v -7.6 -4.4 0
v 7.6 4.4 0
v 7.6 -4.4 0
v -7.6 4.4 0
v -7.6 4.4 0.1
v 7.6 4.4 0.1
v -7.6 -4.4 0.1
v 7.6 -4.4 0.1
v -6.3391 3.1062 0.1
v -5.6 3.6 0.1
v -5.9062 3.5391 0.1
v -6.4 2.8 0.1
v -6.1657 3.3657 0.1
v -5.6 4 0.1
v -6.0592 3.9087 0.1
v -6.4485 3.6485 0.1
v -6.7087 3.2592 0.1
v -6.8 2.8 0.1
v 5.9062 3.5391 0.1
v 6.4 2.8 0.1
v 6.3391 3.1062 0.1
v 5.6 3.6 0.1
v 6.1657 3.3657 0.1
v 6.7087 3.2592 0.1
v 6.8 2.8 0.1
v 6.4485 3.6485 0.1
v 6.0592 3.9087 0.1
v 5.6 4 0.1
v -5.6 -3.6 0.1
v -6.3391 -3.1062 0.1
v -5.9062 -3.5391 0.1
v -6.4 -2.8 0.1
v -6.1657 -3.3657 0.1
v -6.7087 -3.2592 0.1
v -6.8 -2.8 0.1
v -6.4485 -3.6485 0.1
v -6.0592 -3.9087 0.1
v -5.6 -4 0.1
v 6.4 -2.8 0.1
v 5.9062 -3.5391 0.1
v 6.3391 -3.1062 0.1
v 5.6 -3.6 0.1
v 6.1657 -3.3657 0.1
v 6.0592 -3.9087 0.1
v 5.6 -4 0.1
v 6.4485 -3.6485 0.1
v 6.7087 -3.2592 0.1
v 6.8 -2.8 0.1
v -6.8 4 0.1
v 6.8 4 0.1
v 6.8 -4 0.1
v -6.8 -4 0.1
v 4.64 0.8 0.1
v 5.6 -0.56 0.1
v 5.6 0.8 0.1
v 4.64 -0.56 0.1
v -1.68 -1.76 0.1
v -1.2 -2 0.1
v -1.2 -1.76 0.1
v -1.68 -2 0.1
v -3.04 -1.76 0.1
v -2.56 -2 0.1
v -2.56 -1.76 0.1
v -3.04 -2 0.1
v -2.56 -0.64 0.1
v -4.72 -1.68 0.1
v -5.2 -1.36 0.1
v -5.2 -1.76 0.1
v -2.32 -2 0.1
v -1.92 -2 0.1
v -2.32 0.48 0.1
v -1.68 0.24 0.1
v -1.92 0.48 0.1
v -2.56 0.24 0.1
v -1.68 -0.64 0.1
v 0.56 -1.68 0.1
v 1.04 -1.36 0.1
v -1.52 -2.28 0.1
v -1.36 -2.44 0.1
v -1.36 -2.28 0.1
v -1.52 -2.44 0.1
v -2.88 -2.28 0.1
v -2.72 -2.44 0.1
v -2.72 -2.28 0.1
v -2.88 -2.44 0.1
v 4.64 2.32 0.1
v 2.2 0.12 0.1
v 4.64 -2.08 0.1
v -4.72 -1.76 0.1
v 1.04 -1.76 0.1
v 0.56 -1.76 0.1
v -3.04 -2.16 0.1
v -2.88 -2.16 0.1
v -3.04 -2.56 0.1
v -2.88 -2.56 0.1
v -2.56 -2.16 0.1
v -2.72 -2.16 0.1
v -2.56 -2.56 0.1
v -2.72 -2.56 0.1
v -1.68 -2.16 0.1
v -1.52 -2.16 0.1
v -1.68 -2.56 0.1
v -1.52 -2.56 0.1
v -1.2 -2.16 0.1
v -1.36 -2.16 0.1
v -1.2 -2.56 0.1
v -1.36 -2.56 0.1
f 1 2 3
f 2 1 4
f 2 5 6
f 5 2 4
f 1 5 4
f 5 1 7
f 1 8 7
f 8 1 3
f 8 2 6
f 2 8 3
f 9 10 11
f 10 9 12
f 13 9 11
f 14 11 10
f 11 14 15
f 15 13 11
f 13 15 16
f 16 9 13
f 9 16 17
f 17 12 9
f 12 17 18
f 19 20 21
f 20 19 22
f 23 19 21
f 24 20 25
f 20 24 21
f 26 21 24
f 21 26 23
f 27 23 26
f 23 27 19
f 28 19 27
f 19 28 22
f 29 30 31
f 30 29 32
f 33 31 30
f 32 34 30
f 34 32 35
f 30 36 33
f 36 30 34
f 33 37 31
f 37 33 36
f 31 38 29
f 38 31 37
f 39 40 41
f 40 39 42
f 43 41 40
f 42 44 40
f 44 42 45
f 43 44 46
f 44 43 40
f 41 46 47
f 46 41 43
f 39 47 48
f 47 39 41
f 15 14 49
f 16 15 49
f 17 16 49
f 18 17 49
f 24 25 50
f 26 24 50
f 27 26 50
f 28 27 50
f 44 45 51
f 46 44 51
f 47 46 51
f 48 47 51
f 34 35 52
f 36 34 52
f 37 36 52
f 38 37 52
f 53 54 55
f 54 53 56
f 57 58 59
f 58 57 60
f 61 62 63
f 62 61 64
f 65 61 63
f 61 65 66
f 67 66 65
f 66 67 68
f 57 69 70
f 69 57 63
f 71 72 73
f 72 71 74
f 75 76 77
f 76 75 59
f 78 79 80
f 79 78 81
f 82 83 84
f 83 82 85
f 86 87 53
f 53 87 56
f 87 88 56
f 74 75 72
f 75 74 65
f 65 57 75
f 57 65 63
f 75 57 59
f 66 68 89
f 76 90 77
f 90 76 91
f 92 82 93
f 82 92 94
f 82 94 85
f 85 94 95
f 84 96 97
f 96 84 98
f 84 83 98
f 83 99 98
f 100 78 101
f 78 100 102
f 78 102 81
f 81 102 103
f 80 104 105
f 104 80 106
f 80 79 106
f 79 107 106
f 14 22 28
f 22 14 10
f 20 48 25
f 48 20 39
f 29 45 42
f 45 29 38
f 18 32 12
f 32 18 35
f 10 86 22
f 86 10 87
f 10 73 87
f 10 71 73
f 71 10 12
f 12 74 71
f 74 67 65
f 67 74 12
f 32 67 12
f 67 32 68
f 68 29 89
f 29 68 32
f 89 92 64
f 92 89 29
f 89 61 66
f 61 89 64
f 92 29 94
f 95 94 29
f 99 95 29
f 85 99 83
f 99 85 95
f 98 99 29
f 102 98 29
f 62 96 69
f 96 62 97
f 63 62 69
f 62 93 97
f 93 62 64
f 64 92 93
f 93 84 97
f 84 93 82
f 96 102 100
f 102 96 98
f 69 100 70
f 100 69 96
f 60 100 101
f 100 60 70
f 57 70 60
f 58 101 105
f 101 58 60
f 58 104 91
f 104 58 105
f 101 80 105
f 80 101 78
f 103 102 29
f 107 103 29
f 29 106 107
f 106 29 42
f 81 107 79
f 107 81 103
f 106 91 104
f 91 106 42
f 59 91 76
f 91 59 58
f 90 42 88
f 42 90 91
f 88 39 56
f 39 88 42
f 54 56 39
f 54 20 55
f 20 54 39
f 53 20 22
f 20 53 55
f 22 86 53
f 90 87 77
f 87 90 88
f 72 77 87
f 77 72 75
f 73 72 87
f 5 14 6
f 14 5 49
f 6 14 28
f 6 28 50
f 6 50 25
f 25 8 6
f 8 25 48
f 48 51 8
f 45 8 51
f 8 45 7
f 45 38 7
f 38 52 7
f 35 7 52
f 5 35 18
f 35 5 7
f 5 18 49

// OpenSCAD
// file: ../p/box5-12.scad
use <../lib.scad>
function ldraw_lib__box5_12() = [
// 0 Box with 5 Faces without Any Edges
// 0 Name: box5-12.dat
// 0 Author: Chris Dee [cwdee]
// 0 !LDRAW_ORG Primitive UPDATE 2009-02
// 0 !LICENSE Licensed under CC BY 2.0 and CC BY 4.0 : see CAreadme.txt
// 
// 0 BFC CERTIFY CCW
  [0,"BFC","CERTIFY"],
  [0,"BFC","CCW"],
// 
// 0 !HISTORY 2009-09-03 [PTadmin] Official Update 2009-02
// 
// 
// 4 16 1 1 1 1 1 -1 -1 1 -1 -1 1 1
  [4,16,1,1,1,1,1,-1,-1,1,-1,-1,1,1],
// 4 16 -1 0 1 1 0 1 1 1 1 -1 1 1
  [4,16,-1,0,1,1,0,1,1,1,1,-1,1,1],
// 4 16 -1 0 -1 -1 0 1 -1 1 1 -1 1 -1
  [4,16,-1,0,-1,-1,0,1,-1,1,1,-1,1,-1],
// 4 16 1 0 -1 -1 0 -1 -1 1 -1 1 1 -1
  [4,16,1,0,-1,-1,0,-1,-1,1,-1,1,1,-1],
// 4 16 1 0 1 1 0 -1 1 1 -1 1 1 1
  [4,16,1,0,1,1,0,-1,1,1,-1,1,1,1],
// 0
];
module ldraw_lib__box5_12(step=0, col=false, unit=2/5, alt=false, line=0.2, solid=!$preview)
    makepoly(ldraw_lib__box5_12(), step=step, col=col, unit=unit, alt=alt, line=line, solid=solid);
ldraw_lib__box5_12(line=0.2);
// file: ../p/1-4ring2.scad
use <../lib.scad>
function ldraw_lib__1_4ring2() = [
// 0 Ring  2 x 0.25
// 0 Name: 1-4ring2.dat
// 0 Author: Franklin W. Cain [fwcain]
// 0 !LDRAW_ORG Primitive UPDATE 2015-01
// 0 !LICENSE Licensed under CC BY 2.0 and CC BY 4.0 : see CAreadme.txt
// 
// 0 BFC CERTIFY CCW
  [0,"BFC","CERTIFY"],
  [0,"BFC","CCW"],
// 
// 0 !HISTORY 2001-12-31 [PTadmin] Official Update 2001-03
// 0 !HISTORY 2007-06-22 [PTadmin] Header formatted for Contributor Agreement
// 0 !HISTORY 2008-07-01 [PTadmin] Official Update 2008-01
// 0 !HISTORY 2012-02-16 [Philo] Changed to CCW
// 0 !HISTORY 2012-03-30 [PTadmin] Official Update 2012-01
// 0 !HISTORY 2014-12-25 [MMR1988] Fixed a rounding issue
// 0 !HISTORY 2015-10-11 [PTadmin] Official Update 2015-01
// 
// 
// 4 16 3 0 0 2.7717 0 1.1481 1.8478 0 0.7654 2 0 0
  [4,16,3,0,0,2.7717,0,1.1481,1.8478,0,0.7654,2,0,0],
// 4 16 2.7717 0 1.1481 2.1213 0 2.1213 1.4142 0 1.4142 1.8478 0 0.7654
  [4,16,2.7717,0,1.1481,2.1213,0,2.1213,1.4142,0,1.4142,1.8478,0,0.7654],
// 4 16 2.1213 0 2.1213 1.1481 0 2.7717 0.7654 0 1.8478 1.4142 0 1.4142
  [4,16,2.1213,0,2.1213,1.1481,0,2.7717,0.7654,0,1.8478,1.4142,0,1.4142],
// 4 16 1.1481 0 2.7717 0 0 3 0 0 2 0.7654 0 1.8478
  [4,16,1.1481,0,2.7717,0,0,3,0,0,2,0.7654,0,1.8478],
// 0 // Build by Primitive Generator 2
];
module ldraw_lib__1_4ring2(step=0, col=false, unit=2/5, alt=false, line=0.2, solid=!$preview)
    makepoly(ldraw_lib__1_4ring2(), step=step, col=col, unit=unit, alt=alt, line=line, solid=solid);
ldraw_lib__1_4ring2(line=0.2);
// file: ../p/1-4ndis.scad
use <../lib.scad>
function ldraw_lib__1_4ndis() = [
// 0 Disc Negative 0.25
// 0 Name: 1-4ndis.dat
// 0 Author: James Jessiman
// 0 !LDRAW_ORG Primitive UPDATE 2012-01
// 0 !LICENSE Licensed under CC BY 2.0 and CC BY 4.0 : see CAreadme.txt
// 
// 0 BFC CERTIFY CCW
  [0,"BFC","CERTIFY"],
  [0,"BFC","CCW"],
// 
// 0 !HISTORY 2002-03-23 [sbliss] Added BFC Statement
// 0 !HISTORY 2002-04-25 [PTadmin] Official Update 2002-02
// 0 !HISTORY 2007-06-22 [PTadmin] Header formatted for Contributor Agreement
// 0 !HISTORY 2008-07-01 [PTadmin] Official Update 2008-01
// 0 !HISTORY 2012-02-16 [Philo] Changed to CCW
// 0 !HISTORY 2012-03-30 [PTadmin] Official Update 2012-01
// 
// 
// 3 16 0.9239 0 0.3827 1 0 0 1 0 1
  [3,16,0.9239,0,0.3827,1,0,0,1,0,1],
// 3 16 0.7071 0 0.7071 0.9239 0 0.3827 1 0 1
  [3,16,0.7071,0,0.7071,0.9239,0,0.3827,1,0,1],
// 3 16 0.3827 0 0.9239 0.7071 0 0.7071 1 0 1
  [3,16,0.3827,0,0.9239,0.7071,0,0.7071,1,0,1],
// 3 16 0 0 1 0.3827 0 0.9239 1 0 1
  [3,16,0,0,1,0.3827,0,0.9239,1,0,1],
];
module ldraw_lib__1_4ndis(step=0, col=false, unit=2/5, alt=false, line=0.2, solid=!$preview)
    makepoly(ldraw_lib__1_4ndis(), step=step, col=col, unit=unit, alt=alt, line=line, solid=solid);
ldraw_lib__1_4ndis(line=0.2);
// file: ../p/1-4chrd.scad
use <../lib.scad>
function ldraw_lib__1_4chrd() = [
// 0 Chord 0.25
// 0 Name: 1-4chrd.dat
// 0 Author: Tony Hafner [hafhead]
// 0 !LDRAW_ORG Primitive UPDATE 2012-02
// 0 !LICENSE Licensed under CC BY 2.0 and CC BY 4.0 : see CAreadme.txt
// 
// 0 BFC CERTIFY CCW
  [0,"BFC","CERTIFY"],
  [0,"BFC","CCW"],
// 
// 0 !HISTORY 2004-04-22 [PTadmin] Official Update 2004-02
// 0 !HISTORY 2007-10-09 [PTadmin] Header formatted for Contributor Agreement
// 0 !HISTORY 2008-07-01 [PTadmin] Official Update 2008-01
// 0 !HISTORY 2012-08-02 [MMR1988] Re-creation with PrimGen2 and Rectifier
// 0 !HISTORY 2012-08-09 [PTadmin] Official Update 2012-02
// 
// 
// 4 16 0.9239 0 0.3827 0.3827 0 0.9239 0 0 1 1 0 0
  [4,16,0.9239,0,0.3827,0.3827,0,0.9239,0,0,1,1,0,0],
// 3 16 0.7071 0 0.7071 0.3827 0 0.9239 0.9239 0 0.3827
  [3,16,0.7071,0,0.7071,0.3827,0,0.9239,0.9239,0,0.3827],
];
module ldraw_lib__1_4chrd(step=0, col=false, unit=2/5, alt=false, line=0.2, solid=!$preview)
    makepoly(ldraw_lib__1_4chrd(), step=step, col=col, unit=unit, alt=alt, line=line, solid=solid);
ldraw_lib__1_4chrd(line=0.2);
// main file
use <../lib.scad>
use <../p/1-4chrd.scad>
use <../p/1-4ndis.scad>
use <../p/1-4ring2.scad>
use <../p/box5-12.scad>
function ldraw_lib__163156c() = [
// 0 Sticker  1.1 x  1.9 with Town Airport Direction Signs - Left
// 0 Name: 163156c.dat
// 0 Author: Takeshi Takahashi [RainbowDolphin]
// 0 !LDRAW_ORG Part UPDATE 2020-03
// 0 !LICENSE Licensed under CC BY 2.0 and CC BY 4.0 : see CAreadme.txt
// 
// 0 BFC CERTIFY CCW
  [0,"BFC","CERTIFY"],
  [0,"BFC","CCW"],
// 
// 0 !KEYWORDS set 6396
// 
// 0 !HISTORY 2018-01-08 [bercik] OMR version by Robert Paciorek [bercik] with permission of Zoltank82
// 0 !HISTORY 2020-06-24 [RainbowDolphin] File preparation for LDraw Parts Tracker
// 0 !HISTORY 2020-12-29 [PTadmin] Official Update 2020-03
// 
// 
// 1 16 0 -0.25 0 19 0 0 0 0.25 0 0 0 11 box5-12.dat
  [1,16,0,-0.25,0,19,0,0,0,0.25,0,0,0,11, ldraw_lib__box5_12()],
// 
// 1 7 -14 -0.25 7 0 0 -2 0 1 0 2 0 0 1-4chrd.dat
  [1,7,-14,-0.25,7,0,0,-2,0,1,0,2,0,0, ldraw_lib__1_4chrd()],
// 1 0 -14 -0.25 7 0 0 -1 0 1 0 1 0 0 1-4ring2.dat
  [1,0,-14,-0.25,7,0,0,-1,0,1,0,1,0,0, ldraw_lib__1_4ring2()],
// 1 7 14 -0.25 7 2 0 0 0 1 0 0 0 2 1-4chrd.dat
  [1,7,14,-0.25,7,2,0,0,0,1,0,0,0,2, ldraw_lib__1_4chrd()],
// 1 0 14 -0.25 7 1 0 0 0 1 0 0 0 1 1-4ring2.dat
  [1,0,14,-0.25,7,1,0,0,0,1,0,0,0,1, ldraw_lib__1_4ring2()],
// 1 7 -14 -0.25 -7 -2 0 0 0 1 0 0 0 -2 1-4chrd.dat
  [1,7,-14,-0.25,-7,-2,0,0,0,1,0,0,0,-2, ldraw_lib__1_4chrd()],
// 1 0 -14 -0.25 -7 -1 0 0 0 1 0 0 0 -1 1-4ring2.dat
  [1,0,-14,-0.25,-7,-1,0,0,0,1,0,0,0,-1, ldraw_lib__1_4ring2()],
// 1 7 14 -0.25 -7 0 0 2 0 1 0 -2 0 0 1-4chrd.dat
  [1,7,14,-0.25,-7,0,0,2,0,1,0,-2,0,0, ldraw_lib__1_4chrd()],
// 1 0 14 -0.25 -7 0 0 1 0 1 0 -1 0 0 1-4ring2.dat
  [1,0,14,-0.25,-7,0,0,1,0,1,0,-1,0,0, ldraw_lib__1_4ring2()],
// 1 16 -14 -0.25 7 0 0 -3 0 1 0 3 0 0 1-4ndis.dat
  [1,16,-14,-0.25,7,0,0,-3,0,1,0,3,0,0, ldraw_lib__1_4ndis()],
// 1 16 14 -0.25 7 3 0 0 0 1 0 0 0 3 1-4ndis.dat
  [1,16,14,-0.25,7,3,0,0,0,1,0,0,0,3, ldraw_lib__1_4ndis()],
// 1 16 14 -0.25 -7 0 0 3 0 1 0 -3 0 0 1-4ndis.dat
  [1,16,14,-0.25,-7,0,0,3,0,1,0,-3,0,0, ldraw_lib__1_4ndis()],
// 1 16 -14 -0.25 -7 -3 0 0 0 1 0 0 0 -3 1-4ndis.dat
  [1,16,-14,-0.25,-7,-3,0,0,0,1,0,0,0,-3, ldraw_lib__1_4ndis()],
// 4 4 14 -0.25 -1.4 14 -0.25 2 11.6 -0.25 2 11.6 -0.25 -1.4
  [4,4,14,-0.25,-1.4,14,-0.25,2,11.6,-0.25,2,11.6,-0.25,-1.4],
// 4 0 -3 -0.25 -5 -3 -0.25 -4.4 -4.2 -0.25 -4.4 -4.2 -0.25 -5
  [4,0,-3,-0.25,-5,-3,-0.25,-4.4,-4.2,-0.25,-4.4,-4.2,-0.25,-5],
// 4 0 -6.4 -0.25 -5 -6.4 -0.25 -4.4 -7.6 -0.25 -4.4 -7.6 -0.25 -5
  [4,0,-6.4,-0.25,-5,-6.4,-0.25,-4.4,-7.6,-0.25,-4.4,-7.6,-0.25,-5],
// 4 0 -7.6 -0.25 -4.4 -6.4 -0.25 -4.4 -6.4 -0.25 -1.6 -11.8 -0.25 -4.2
  [4,0,-7.6,-0.25,-4.4,-6.4,-0.25,-4.4,-6.4,-0.25,-1.6,-11.8,-0.25,-4.2],
// 4 0 -11.8 -0.25 -4.2 -6.4 -0.25 -1.6 -13 -0.25 -3.4 -13 -0.25 -4.4
  [4,0,-11.8,-0.25,-4.2,-6.4,-0.25,-1.6,-13,-0.25,-3.4,-13,-0.25,-4.4],
// 4 0 -5.8 -0.25 -5 -4.8 -0.25 -5 -4.2 -0.25 -4.4 -6.4 -0.25 -4.4
  [4,0,-5.8,-0.25,-5,-4.8,-0.25,-5,-4.2,-0.25,-4.4,-6.4,-0.25,-4.4],
// 4 0 -4.2 -0.25 0.6 -4.8 -0.25 1.2 -5.8 -0.25 1.2 -6.4 -0.25 0.6
  [4,0,-4.2,-0.25,0.6,-4.8,-0.25,1.2,-5.8,-0.25,1.2,-6.4,-0.25,0.6],
// 4 0 -3 -0.25 -4.4 1.4 -0.25 -4.2 2.6 -0.25 -3.4 -4.2 -0.25 -1.6
  [4,0,-3,-0.25,-4.4,1.4,-0.25,-4.2,2.6,-0.25,-3.4,-4.2,-0.25,-1.6],
// 4 0 -3.4 -0.25 -6.1 -3.4 -0.25 -5.7 -3.8 -0.25 -5.7 -3.8 -0.25 -6.1
  [4,0,-3.4,-0.25,-6.1,-3.4,-0.25,-5.7,-3.8,-0.25,-5.7,-3.8,-0.25,-6.1],
// 4 0 -6.8 -0.25 -6.1 -6.8 -0.25 -5.7 -7.2 -0.25 -5.7 -7.2 -0.25 -6.1
  [4,0,-6.8,-0.25,-6.1,-6.8,-0.25,-5.7,-7.2,-0.25,-5.7,-7.2,-0.25,-6.1],
// 3 4 11.6 -0.25 5.8 5.5 -0.25 0.3 11.6 -0.25 2
  [3,4,11.6,-0.25,5.8,5.5,-0.25,0.3,11.6,-0.25,2],
// 3 4 11.6 -0.25 2 5.5 -0.25 0.3 11.6 -0.25 -1.4
  [3,4,11.6,-0.25,2,5.5,-0.25,0.3,11.6,-0.25,-1.4],
// 3 4 5.5 -0.25 0.3 11.6 -0.25 -5.2 11.6 -0.25 -1.4
  [3,4,5.5,-0.25,0.3,11.6,-0.25,-5.2,11.6,-0.25,-1.4],
// 4 0 -4.2 -0.25 0.6 -6.4 -0.25 0.6 -6.4 -0.25 -1.6 -4.2 -0.25 -1.6
  [4,0,-4.2,-0.25,0.6,-6.4,-0.25,0.6,-6.4,-0.25,-1.6,-4.2,-0.25,-1.6],
// 4 0 -4.2 -0.25 -1.6 -6.4 -0.25 -1.6 -6.4 -0.25 -4.4 -4.2 -0.25 -4.4
  [4,0,-4.2,-0.25,-1.6,-6.4,-0.25,-1.6,-6.4,-0.25,-4.4,-4.2,-0.25,-4.4],
// 3 0 -4.2 -0.25 -1.6 -4.2 -0.25 -4.4 -3 -0.25 -4.4
  [3,0,-4.2,-0.25,-1.6,-4.2,-0.25,-4.4,-3,-0.25,-4.4],
// 3 0 -11.8 -0.25 -4.2 -13 -0.25 -4.4 -11.8 -0.25 -4.4
  [3,0,-11.8,-0.25,-4.2,-13,-0.25,-4.4,-11.8,-0.25,-4.4],
// 4 0 2.6 -0.25 -4.4 2.6 -0.25 -3.4 1.4 -0.25 -4.2 1.4 -0.25 -4.4
  [4,0,2.6,-0.25,-4.4,2.6,-0.25,-3.4,1.4,-0.25,-4.2,1.4,-0.25,-4.4],
// 4 0 -7.2 -0.25 -5.7 -7.2 -0.25 -5.4 -7.6 -0.25 -5.4 -7.6 -0.25 -6.4
  [4,0,-7.2,-0.25,-5.7,-7.2,-0.25,-5.4,-7.6,-0.25,-5.4,-7.6,-0.25,-6.4],
// 3 0 -7.2 -0.25 -5.7 -7.6 -0.25 -6.4 -7.2 -0.25 -6.1
  [3,0,-7.2,-0.25,-5.7,-7.6,-0.25,-6.4,-7.2,-0.25,-6.1],
// 3 0 -7.2 -0.25 -6.1 -7.6 -0.25 -6.4 -7.2 -0.25 -6.4
  [3,0,-7.2,-0.25,-6.1,-7.6,-0.25,-6.4,-7.2,-0.25,-6.4],
// 4 0 -6.4 -0.25 -5.4 -6.8 -0.25 -5.4 -6.8 -0.25 -5.7 -6.4 -0.25 -6.4
  [4,0,-6.4,-0.25,-5.4,-6.8,-0.25,-5.4,-6.8,-0.25,-5.7,-6.4,-0.25,-6.4],
// 3 0 -6.8 -0.25 -5.7 -6.8 -0.25 -6.1 -6.4 -0.25 -6.4
  [3,0,-6.8,-0.25,-5.7,-6.8,-0.25,-6.1,-6.4,-0.25,-6.4],
// 3 0 -6.8 -0.25 -6.1 -6.8 -0.25 -6.4 -6.4 -0.25 -6.4
  [3,0,-6.8,-0.25,-6.1,-6.8,-0.25,-6.4,-6.4,-0.25,-6.4],
// 4 0 -3.8 -0.25 -5.7 -3.8 -0.25 -5.4 -4.2 -0.25 -5.4 -4.2 -0.25 -6.4
  [4,0,-3.8,-0.25,-5.7,-3.8,-0.25,-5.4,-4.2,-0.25,-5.4,-4.2,-0.25,-6.4],
// 3 0 -3.8 -0.25 -5.7 -4.2 -0.25 -6.4 -3.8 -0.25 -6.1
  [3,0,-3.8,-0.25,-5.7,-4.2,-0.25,-6.4,-3.8,-0.25,-6.1],
// 3 0 -3.8 -0.25 -6.1 -4.2 -0.25 -6.4 -3.8 -0.25 -6.4
  [3,0,-3.8,-0.25,-6.1,-4.2,-0.25,-6.4,-3.8,-0.25,-6.4],
// 4 0 -3 -0.25 -5.4 -3.4 -0.25 -5.4 -3.4 -0.25 -5.7 -3 -0.25 -6.4
  [4,0,-3,-0.25,-5.4,-3.4,-0.25,-5.4,-3.4,-0.25,-5.7,-3,-0.25,-6.4],
// 3 0 -3.4 -0.25 -5.7 -3.4 -0.25 -6.1 -3 -0.25 -6.4
  [3,0,-3.4,-0.25,-5.7,-3.4,-0.25,-6.1,-3,-0.25,-6.4],
// 3 0 -3.4 -0.25 -6.1 -3.4 -0.25 -6.4 -3 -0.25 -6.4
  [3,0,-3.4,-0.25,-6.1,-3.4,-0.25,-6.4,-3,-0.25,-6.4],
// 4 0 14 -0.25 10 -14 -0.25 10 -14 -0.25 9 14 -0.25 9
  [4,0,14,-0.25,10,-14,-0.25,10,-14,-0.25,9,14,-0.25,9],
// 4 0 17 -0.25 7 16 -0.25 7 16 -0.25 -7 17 -0.25 -7
  [4,0,17,-0.25,7,16,-0.25,7,16,-0.25,-7,17,-0.25,-7],
// 4 0 14 -0.25 -9 -14 -0.25 -9 -14 -0.25 -10 14 -0.25 -10
  [4,0,14,-0.25,-9,-14,-0.25,-9,-14,-0.25,-10,14,-0.25,-10],
// 4 0 -16 -0.25 7 -17 -0.25 7 -17 -0.25 -7 -16 -0.25 -7
  [4,0,-16,-0.25,7,-17,-0.25,7,-17,-0.25,-7,-16,-0.25,-7],
// 4 7 11.6 -0.25 5.8 14 -0.25 9 -14 -0.25 9 5.5 -0.25 0.3
  [4,7,11.6,-0.25,5.8,14,-0.25,9,-14,-0.25,9,5.5,-0.25,0.3],
// 3 7 -14 -0.25 9 -4.8 -0.25 1.2 5.5 -0.25 0.3
  [3,7,-14,-0.25,9,-4.8,-0.25,1.2,5.5,-0.25,0.3],
// 4 7 -5.8 -0.25 1.2 -4.8 -0.25 1.2 -14 -0.25 9 -16 -0.25 7
  [4,7,-5.8,-0.25,1.2,-4.8,-0.25,1.2,-14,-0.25,9,-16,-0.25,7],
// 3 7 -16 -0.25 7 -6.4 -0.25 0.6 -5.8 -0.25 1.2
  [3,7,-16,-0.25,7,-6.4,-0.25,0.6,-5.8,-0.25,1.2],
// 4 7 -6.4 -0.25 -1.6 -6.4 -0.25 0.6 -16 -0.25 7 -13 -0.25 -3.4
  [4,7,-6.4,-0.25,-1.6,-6.4,-0.25,0.6,-16,-0.25,7,-13,-0.25,-3.4],
// 4 7 -13 -0.25 -3.4 -16 -0.25 7 -16 -0.25 -7 -13 -0.25 -4.4
  [4,7,-13,-0.25,-3.4,-16,-0.25,7,-16,-0.25,-7,-13,-0.25,-4.4],
// 4 7 -13 -0.25 -4.4 -16 -0.25 -7 -14 -0.25 -9 -11.8 -0.25 -4.4
  [4,7,-13,-0.25,-4.4,-16,-0.25,-7,-14,-0.25,-9,-11.8,-0.25,-4.4],
// 4 7 -7.6 -0.25 -5 -11.8 -0.25 -4.4 -14 -0.25 -9 -7.6 -0.25 -5.4
  [4,7,-7.6,-0.25,-5,-11.8,-0.25,-4.4,-14,-0.25,-9,-7.6,-0.25,-5.4],
// 4 7 -11.8 -0.25 -4.2 -11.8 -0.25 -4.4 -7.6 -0.25 -5 -7.6 -0.25 -4.4
  [4,7,-11.8,-0.25,-4.2,-11.8,-0.25,-4.4,-7.6,-0.25,-5,-7.6,-0.25,-4.4],
// 3 7 -7.6 -0.25 -5.4 -14 -0.25 -9 -7.6 -0.25 -6.4
  [3,7,-7.6,-0.25,-5.4,-14,-0.25,-9,-7.6,-0.25,-6.4],
// 3 7 -7.2 -0.25 -6.4 -7.6 -0.25 -6.4 -14 -0.25 -9
  [3,7,-7.2,-0.25,-6.4,-7.6,-0.25,-6.4,-14,-0.25,-9],
// 3 7 -6.8 -0.25 -6.4 -7.2 -0.25 -6.4 -14 -0.25 -9
  [3,7,-6.8,-0.25,-6.4,-7.2,-0.25,-6.4,-14,-0.25,-9],
// 4 7 -7.2 -0.25 -6.1 -7.2 -0.25 -6.4 -6.8 -0.25 -6.4 -6.8 -0.25 -6.1
  [4,7,-7.2,-0.25,-6.1,-7.2,-0.25,-6.4,-6.8,-0.25,-6.4,-6.8,-0.25,-6.1],
// 3 7 -6.4 -0.25 -6.4 -6.8 -0.25 -6.4 -14 -0.25 -9
  [3,7,-6.4,-0.25,-6.4,-6.8,-0.25,-6.4,-14,-0.25,-9],
// 3 7 -4.2 -0.25 -6.4 -6.4 -0.25 -6.4 -14 -0.25 -9
  [3,7,-4.2,-0.25,-6.4,-6.4,-0.25,-6.4,-14,-0.25,-9],
// 4 7 -6.4 -0.25 -5.4 -5.8 -0.25 -5 -6.4 -0.25 -5 -6.8 -0.25 -5.4
  [4,7,-6.4,-0.25,-5.4,-5.8,-0.25,-5,-6.4,-0.25,-5,-6.8,-0.25,-5.4],
// 3 7 -6.4 -0.25 -4.4 -6.4 -0.25 -5 -5.8 -0.25 -5
  [3,7,-6.4,-0.25,-4.4,-6.4,-0.25,-5,-5.8,-0.25,-5],
// 4 7 -7.2 -0.25 -5.4 -6.8 -0.25 -5.4 -6.4 -0.25 -5 -7.6 -0.25 -5
  [4,7,-7.2,-0.25,-5.4,-6.8,-0.25,-5.4,-6.4,-0.25,-5,-7.6,-0.25,-5],
// 3 7 -7.6 -0.25 -5 -7.6 -0.25 -5.4 -7.2 -0.25 -5.4
  [3,7,-7.6,-0.25,-5,-7.6,-0.25,-5.4,-7.2,-0.25,-5.4],
// 4 7 -6.8 -0.25 -5.4 -7.2 -0.25 -5.4 -7.2 -0.25 -5.7 -6.8 -0.25 -5.7
  [4,7,-6.8,-0.25,-5.4,-7.2,-0.25,-5.4,-7.2,-0.25,-5.7,-6.8,-0.25,-5.7],
// 4 7 -6.4 -0.25 -5.4 -6.4 -0.25 -6.4 -4.2 -0.25 -6.4 -4.2 -0.25 -5.4
  [4,7,-6.4,-0.25,-5.4,-6.4,-0.25,-6.4,-4.2,-0.25,-6.4,-4.2,-0.25,-5.4],
// 4 7 -5.8 -0.25 -5 -6.4 -0.25 -5.4 -4.2 -0.25 -5.4 -4.8 -0.25 -5
  [4,7,-5.8,-0.25,-5,-6.4,-0.25,-5.4,-4.2,-0.25,-5.4,-4.8,-0.25,-5],
// 4 7 -4.2 -0.25 -5 -4.8 -0.25 -5 -4.2 -0.25 -5.4 -3.8 -0.25 -5.4
  [4,7,-4.2,-0.25,-5,-4.8,-0.25,-5,-4.2,-0.25,-5.4,-3.8,-0.25,-5.4],
// 3 7 -4.2 -0.25 -4.4 -4.8 -0.25 -5 -4.2 -0.25 -5
  [3,7,-4.2,-0.25,-4.4,-4.8,-0.25,-5,-4.2,-0.25,-5],
// 4 7 -4.2 -0.25 -5 -3.8 -0.25 -5.4 -3.4 -0.25 -5.4 -3 -0.25 -5
  [4,7,-4.2,-0.25,-5,-3.8,-0.25,-5.4,-3.4,-0.25,-5.4,-3,-0.25,-5],
// 4 7 -3 -0.25 -5 -3.4 -0.25 -5.4 -3 -0.25 -5.4 1.4 -0.25 -4.4
  [4,7,-3,-0.25,-5,-3.4,-0.25,-5.4,-3,-0.25,-5.4,1.4,-0.25,-4.4],
// 4 7 -3.4 -0.25 -5.4 -3.8 -0.25 -5.4 -3.8 -0.25 -5.7 -3.4 -0.25 -5.7
  [4,7,-3.4,-0.25,-5.4,-3.8,-0.25,-5.4,-3.8,-0.25,-5.7,-3.4,-0.25,-5.7],
// 3 7 -3.8 -0.25 -6.4 -4.2 -0.25 -6.4 -14 -0.25 -9
  [3,7,-3.8,-0.25,-6.4,-4.2,-0.25,-6.4,-14,-0.25,-9],
// 3 7 -3.4 -0.25 -6.4 -3.8 -0.25 -6.4 -14 -0.25 -9
  [3,7,-3.4,-0.25,-6.4,-3.8,-0.25,-6.4,-14,-0.25,-9],
// 4 7 -3 -0.25 -6.4 -3.4 -0.25 -6.4 -14 -0.25 -9 14 -0.25 -9
  [4,7,-3,-0.25,-6.4,-3.4,-0.25,-6.4,-14,-0.25,-9,14,-0.25,-9],
// 4 7 -3.8 -0.25 -6.1 -3.8 -0.25 -6.4 -3.4 -0.25 -6.4 -3.4 -0.25 -6.1
  [4,7,-3.8,-0.25,-6.1,-3.8,-0.25,-6.4,-3.4,-0.25,-6.4,-3.4,-0.25,-6.1],
// 4 7 -3 -0.25 -5.4 -3 -0.25 -6.4 14 -0.25 -9 1.4 -0.25 -4.4
  [4,7,-3,-0.25,-5.4,-3,-0.25,-6.4,14,-0.25,-9,1.4,-0.25,-4.4],
// 4 7 -3 -0.25 -5 1.4 -0.25 -4.4 1.4 -0.25 -4.2 -3 -0.25 -4.4
  [4,7,-3,-0.25,-5,1.4,-0.25,-4.4,1.4,-0.25,-4.2,-3,-0.25,-4.4],
// 4 7 2.6 -0.25 -4.4 1.4 -0.25 -4.4 14 -0.25 -9 11.6 -0.25 -5.2
  [4,7,2.6,-0.25,-4.4,1.4,-0.25,-4.4,14,-0.25,-9,11.6,-0.25,-5.2],
// 4 7 11.6 -0.25 -5.2 14 -0.25 -9 16 -0.25 -7 11.6 -0.25 -1.4
  [4,7,11.6,-0.25,-5.2,14,-0.25,-9,16,-0.25,-7,11.6,-0.25,-1.4],
// 3 7 14 -0.25 -1.4 11.6 -0.25 -1.4 16 -0.25 -7
  [3,7,14,-0.25,-1.4,11.6,-0.25,-1.4,16,-0.25,-7],
// 4 7 14 -0.25 2 14 -0.25 -1.4 16 -0.25 -7 16 -0.25 7
  [4,7,14,-0.25,2,14,-0.25,-1.4,16,-0.25,-7,16,-0.25,7],
// 4 7 11.6 -0.25 2 14 -0.25 2 16 -0.25 7 14 -0.25 9
  [4,7,11.6,-0.25,2,14,-0.25,2,16,-0.25,7,14,-0.25,9],
// 3 7 14 -0.25 9 11.6 -0.25 5.8 11.6 -0.25 2
  [3,7,14,-0.25,9,11.6,-0.25,5.8,11.6,-0.25,2],
// 4 7 2.6 -0.25 -3.4 2.6 -0.25 -4.4 11.6 -0.25 -5.2 5.5 -0.25 0.3
  [4,7,2.6,-0.25,-3.4,2.6,-0.25,-4.4,11.6,-0.25,-5.2,5.5,-0.25,0.3],
// 4 7 -4.2 -0.25 -1.6 2.6 -0.25 -3.4 5.5 -0.25 0.3 -4.2 -0.25 0.6
  [4,7,-4.2,-0.25,-1.6,2.6,-0.25,-3.4,5.5,-0.25,0.3,-4.2,-0.25,0.6],
// 3 7 -4.8 -0.25 1.2 -4.2 -0.25 0.6 5.5 -0.25 0.3
  [3,7,-4.8,-0.25,1.2,-4.2,-0.25,0.6,5.5,-0.25,0.3],
// 4 16 -19 -0.25 11 -17 -0.25 10 -14 -0.25 10 19 -0.25 11
  [4,16,-19,-0.25,11,-17,-0.25,10,-14,-0.25,10,19,-0.25,11],
// 3 16 19 -0.25 11 -14 -0.25 10 14 -0.25 10
  [3,16,19,-0.25,11,-14,-0.25,10,14,-0.25,10],
// 3 16 19 -0.25 11 14 -0.25 10 17 -0.25 10
  [3,16,19,-0.25,11,14,-0.25,10,17,-0.25,10],
// 3 16 19 -0.25 11 17 -0.25 10 17 -0.25 7
  [3,16,19,-0.25,11,17,-0.25,10,17,-0.25,7],
// 4 16 19 -0.25 11 17 -0.25 7 17 -0.25 -7 19 -0.25 -11
  [4,16,19,-0.25,11,17,-0.25,7,17,-0.25,-7,19,-0.25,-11],
// 3 16 17 -0.25 -7 17 -0.25 -10 19 -0.25 -11
  [3,16,17,-0.25,-7,17,-0.25,-10,19,-0.25,-11],
// 4 16 19 -0.25 -11 17 -0.25 -10 14 -0.25 -10 -19 -0.25 -11
  [4,16,19,-0.25,-11,17,-0.25,-10,14,-0.25,-10,-19,-0.25,-11],
// 3 16 14 -0.25 -10 -14 -0.25 -10 -19 -0.25 -11
  [3,16,14,-0.25,-10,-14,-0.25,-10,-19,-0.25,-11],
// 3 16 -14 -0.25 -10 -17 -0.25 -10 -19 -0.25 -11
  [3,16,-14,-0.25,-10,-17,-0.25,-10,-19,-0.25,-11],
// 3 16 -17 -0.25 -7 -19 -0.25 -11 -17 -0.25 -10
  [3,16,-17,-0.25,-7,-19,-0.25,-11,-17,-0.25,-10],
// 4 16 -19 -0.25 -11 -17 -0.25 -7 -17 -0.25 7 -19 -0.25 11
  [4,16,-19,-0.25,-11,-17,-0.25,-7,-17,-0.25,7,-19,-0.25,11],
// 3 16 -19 -0.25 11 -17 -0.25 7 -17 -0.25 10
  [3,16,-19,-0.25,11,-17,-0.25,7,-17,-0.25,10],
];
module ldraw_lib__163156c(step=0, col=false, unit=2/5, alt=false, line=0.2, solid=!$preview)
    makepoly(ldraw_lib__163156c(), step=step, col=col, unit=unit, alt=alt, line=line, solid=solid);
ldraw_lib__163156c(line=0.2);
